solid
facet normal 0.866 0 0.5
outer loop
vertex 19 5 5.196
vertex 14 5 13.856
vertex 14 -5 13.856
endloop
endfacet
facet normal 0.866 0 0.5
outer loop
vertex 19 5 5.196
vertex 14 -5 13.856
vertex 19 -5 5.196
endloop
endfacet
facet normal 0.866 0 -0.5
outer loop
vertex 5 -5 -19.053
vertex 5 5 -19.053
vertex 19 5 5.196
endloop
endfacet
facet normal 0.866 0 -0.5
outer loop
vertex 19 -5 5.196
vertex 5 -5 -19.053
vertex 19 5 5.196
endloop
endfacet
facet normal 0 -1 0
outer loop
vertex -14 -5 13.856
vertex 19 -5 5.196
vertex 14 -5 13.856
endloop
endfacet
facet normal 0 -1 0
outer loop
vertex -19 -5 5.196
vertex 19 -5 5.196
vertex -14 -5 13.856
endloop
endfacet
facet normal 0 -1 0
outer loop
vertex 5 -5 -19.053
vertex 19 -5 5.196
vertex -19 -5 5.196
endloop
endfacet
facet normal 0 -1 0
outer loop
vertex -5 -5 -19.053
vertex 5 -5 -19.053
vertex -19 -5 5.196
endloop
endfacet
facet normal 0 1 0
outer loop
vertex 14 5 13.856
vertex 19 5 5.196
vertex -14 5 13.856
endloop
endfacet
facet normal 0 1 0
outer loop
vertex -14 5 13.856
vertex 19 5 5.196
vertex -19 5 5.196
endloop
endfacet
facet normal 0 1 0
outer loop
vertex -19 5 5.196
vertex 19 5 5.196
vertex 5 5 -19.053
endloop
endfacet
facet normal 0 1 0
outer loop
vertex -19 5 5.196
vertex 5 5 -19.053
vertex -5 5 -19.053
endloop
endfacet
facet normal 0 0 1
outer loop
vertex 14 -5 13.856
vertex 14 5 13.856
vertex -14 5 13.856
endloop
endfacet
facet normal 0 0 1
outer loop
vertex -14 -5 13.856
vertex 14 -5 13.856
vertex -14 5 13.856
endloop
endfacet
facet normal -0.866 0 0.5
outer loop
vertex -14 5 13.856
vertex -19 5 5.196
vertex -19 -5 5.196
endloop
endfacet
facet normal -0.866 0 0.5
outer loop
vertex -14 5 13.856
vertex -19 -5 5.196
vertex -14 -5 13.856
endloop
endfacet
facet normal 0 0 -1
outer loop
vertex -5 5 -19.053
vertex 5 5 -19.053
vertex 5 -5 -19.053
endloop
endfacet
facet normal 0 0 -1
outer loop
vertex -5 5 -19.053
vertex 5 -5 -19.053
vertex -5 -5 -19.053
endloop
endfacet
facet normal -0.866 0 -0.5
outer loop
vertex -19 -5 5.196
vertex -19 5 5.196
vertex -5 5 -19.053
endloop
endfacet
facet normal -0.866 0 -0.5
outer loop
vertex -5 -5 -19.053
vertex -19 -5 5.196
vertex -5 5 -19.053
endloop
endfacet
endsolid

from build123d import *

# Parameters (mm, degrees)
ESTRUSIONE_ESTRUSIONE1_DEPTH = 5
TAGLIO_ESTRUSIONE1_DEPTH     = 10
RIPETIZIONECIRCOLARE1_COUNT  = 3


with BuildPart() as part:
    # Schizzo1 → Estrusione-Estrusione1 (new, symmetric)
    with BuildSketch(Plane(origin=(0, 0, 0), x_dir=(1, 0, 0), z_dir=(0, 1, 0))):
        Polygon((-24, -13.856406461), (0, 27.712812921), (24, -13.856406461), align=None)
    extrude(amount=ESTRUSIONE_ESTRUSIONE1_DEPTH, both=True)

    # Schizzo2 → Taglio-Estrusione1 (cut)
    with BuildSketch(Plane(origin=(0, 5, 0), x_dir=(1, 0, 0), z_dir=(0, 1, 0))):
        Polygon((14, -13.856406461), (19, -5.196152423), (24, -13.856406461), align=None)
    taglio_estrusione1 = extrude(amount=-TAGLIO_ESTRUSIONE1_DEPTH, mode=Mode.SUBTRACT)

    # RipetizioneCircolare1: Taglio-Estrusione1 ×3 about axis
    ripetizionecircolare1_axis = Axis((0, 0, 0), (0, 1, 0))
    for i in range(1, RIPETIZIONECIRCOLARE1_COUNT):
        add(taglio_estrusione1.rotate(ripetizionecircolare1_axis, i * 360 / RIPETIZIONECIRCOLARE1_COUNT), mode=Mode.SUBTRACT)


solid = part.part
